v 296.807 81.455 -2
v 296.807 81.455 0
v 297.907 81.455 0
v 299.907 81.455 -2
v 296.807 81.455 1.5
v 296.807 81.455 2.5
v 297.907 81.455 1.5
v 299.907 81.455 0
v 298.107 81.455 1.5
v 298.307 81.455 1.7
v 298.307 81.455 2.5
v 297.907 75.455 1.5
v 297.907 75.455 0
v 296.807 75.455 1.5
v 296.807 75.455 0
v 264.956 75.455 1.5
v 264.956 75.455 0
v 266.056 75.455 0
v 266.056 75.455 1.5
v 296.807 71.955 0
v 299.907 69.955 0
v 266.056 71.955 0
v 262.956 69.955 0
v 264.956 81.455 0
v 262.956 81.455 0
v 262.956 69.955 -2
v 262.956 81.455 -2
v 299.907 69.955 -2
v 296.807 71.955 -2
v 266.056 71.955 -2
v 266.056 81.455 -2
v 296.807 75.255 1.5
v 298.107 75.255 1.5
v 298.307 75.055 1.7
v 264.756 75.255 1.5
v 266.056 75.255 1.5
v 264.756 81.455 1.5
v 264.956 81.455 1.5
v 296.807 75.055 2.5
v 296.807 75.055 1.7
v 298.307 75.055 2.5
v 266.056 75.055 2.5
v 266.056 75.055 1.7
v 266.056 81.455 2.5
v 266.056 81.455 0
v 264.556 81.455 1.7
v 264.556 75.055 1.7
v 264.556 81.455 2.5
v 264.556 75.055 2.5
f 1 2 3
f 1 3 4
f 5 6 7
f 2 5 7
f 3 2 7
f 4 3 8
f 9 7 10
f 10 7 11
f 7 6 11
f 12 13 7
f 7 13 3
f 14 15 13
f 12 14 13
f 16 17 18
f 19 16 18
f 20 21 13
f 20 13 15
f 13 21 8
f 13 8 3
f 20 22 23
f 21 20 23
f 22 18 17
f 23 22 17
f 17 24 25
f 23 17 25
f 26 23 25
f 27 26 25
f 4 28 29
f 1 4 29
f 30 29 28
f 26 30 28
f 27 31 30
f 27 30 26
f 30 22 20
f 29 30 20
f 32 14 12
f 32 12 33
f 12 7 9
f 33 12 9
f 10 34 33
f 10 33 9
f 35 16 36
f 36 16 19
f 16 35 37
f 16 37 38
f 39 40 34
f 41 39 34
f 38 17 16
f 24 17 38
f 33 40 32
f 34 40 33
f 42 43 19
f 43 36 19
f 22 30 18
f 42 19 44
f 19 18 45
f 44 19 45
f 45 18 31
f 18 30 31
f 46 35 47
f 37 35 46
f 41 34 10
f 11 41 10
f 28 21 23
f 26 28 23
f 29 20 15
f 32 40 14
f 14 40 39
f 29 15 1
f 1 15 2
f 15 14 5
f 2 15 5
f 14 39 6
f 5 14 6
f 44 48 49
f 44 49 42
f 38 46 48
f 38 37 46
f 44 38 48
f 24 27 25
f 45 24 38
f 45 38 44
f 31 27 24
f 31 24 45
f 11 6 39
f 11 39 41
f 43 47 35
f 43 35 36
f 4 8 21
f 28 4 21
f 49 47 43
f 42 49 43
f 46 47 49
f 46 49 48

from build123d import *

# Parameters (mm, degrees)
BOSS_EXTRUDE1_DEPTH = 2
SKETCH2_W           = 1.100075991
SKETCH2_H           = 6.000695173
BOSS_EXTRUDE2_DEPTH = 1.5
SKETCH3_W           = 1.500075991
SKETCH3_H           = 6.400695173
BOSS_EXTRUDE3_DEPTH = 1
CHAMFER1_SIZE       = 0.2


with BuildPart() as part:
    # Sketch1 → Boss-Extrude1 (new body)
    with BuildSketch(Plane(origin=(0, 0, 0), x_dir=(-1, 0, 0), z_dir=(0, 0, -1))):
        Polygon((-262.955830275, 81.455427603), (-266.055906266, 81.455427603), (-266.055906266, 71.95473243), (-273.006316619, 71.95473243), (-296.80691239, 71.95473243), (-296.80691239, 81.455427603), (-299.906988381, 81.455427603), (-299.906988381, 69.95473243), (-262.955830275, 69.95473243), align=None)
    extrude(amount=BOSS_EXTRUDE1_DEPTH)

    # Sketch2 → Boss-Extrude2 (add)
    with BuildSketch(Plane.XY):
        with Locations((265.505868271, 78.455080017)):
            Rectangle(SKETCH2_W, SKETCH2_H)
        with Locations((297.356950385, 78.455080017)):
            Rectangle(SKETCH2_W, SKETCH2_H)
    extrude(amount=BOSS_EXTRUDE2_DEPTH)

    # Sketch3 → Boss-Extrude3 (add)
    with BuildSketch(Plane.XY.offset(1.5)):
        with Locations((265.305868271, 78.255080017)):
            Rectangle(SKETCH3_W, SKETCH3_H)
        with Locations((297.556950386, 78.255080017)):
            Rectangle(SKETCH3_W, SKETCH3_H)
    extrude(amount=BOSS_EXTRUDE3_DEPTH)

    # Chamfer1
    chamfer1_edges = [part.edges().sort_by_distance(p)[0] for p in [
        (264.555830275, 78.255080016, 1.5),
        (265.305868271, 75.05473243, 1.5),
        (297.556950386, 75.05473243, 1.5),
        (298.306988381, 78.255080016, 1.5),
    ]]
    chamfer(chamfer1_edges, length=CHAMFER1_SIZE)


solid = part.part
